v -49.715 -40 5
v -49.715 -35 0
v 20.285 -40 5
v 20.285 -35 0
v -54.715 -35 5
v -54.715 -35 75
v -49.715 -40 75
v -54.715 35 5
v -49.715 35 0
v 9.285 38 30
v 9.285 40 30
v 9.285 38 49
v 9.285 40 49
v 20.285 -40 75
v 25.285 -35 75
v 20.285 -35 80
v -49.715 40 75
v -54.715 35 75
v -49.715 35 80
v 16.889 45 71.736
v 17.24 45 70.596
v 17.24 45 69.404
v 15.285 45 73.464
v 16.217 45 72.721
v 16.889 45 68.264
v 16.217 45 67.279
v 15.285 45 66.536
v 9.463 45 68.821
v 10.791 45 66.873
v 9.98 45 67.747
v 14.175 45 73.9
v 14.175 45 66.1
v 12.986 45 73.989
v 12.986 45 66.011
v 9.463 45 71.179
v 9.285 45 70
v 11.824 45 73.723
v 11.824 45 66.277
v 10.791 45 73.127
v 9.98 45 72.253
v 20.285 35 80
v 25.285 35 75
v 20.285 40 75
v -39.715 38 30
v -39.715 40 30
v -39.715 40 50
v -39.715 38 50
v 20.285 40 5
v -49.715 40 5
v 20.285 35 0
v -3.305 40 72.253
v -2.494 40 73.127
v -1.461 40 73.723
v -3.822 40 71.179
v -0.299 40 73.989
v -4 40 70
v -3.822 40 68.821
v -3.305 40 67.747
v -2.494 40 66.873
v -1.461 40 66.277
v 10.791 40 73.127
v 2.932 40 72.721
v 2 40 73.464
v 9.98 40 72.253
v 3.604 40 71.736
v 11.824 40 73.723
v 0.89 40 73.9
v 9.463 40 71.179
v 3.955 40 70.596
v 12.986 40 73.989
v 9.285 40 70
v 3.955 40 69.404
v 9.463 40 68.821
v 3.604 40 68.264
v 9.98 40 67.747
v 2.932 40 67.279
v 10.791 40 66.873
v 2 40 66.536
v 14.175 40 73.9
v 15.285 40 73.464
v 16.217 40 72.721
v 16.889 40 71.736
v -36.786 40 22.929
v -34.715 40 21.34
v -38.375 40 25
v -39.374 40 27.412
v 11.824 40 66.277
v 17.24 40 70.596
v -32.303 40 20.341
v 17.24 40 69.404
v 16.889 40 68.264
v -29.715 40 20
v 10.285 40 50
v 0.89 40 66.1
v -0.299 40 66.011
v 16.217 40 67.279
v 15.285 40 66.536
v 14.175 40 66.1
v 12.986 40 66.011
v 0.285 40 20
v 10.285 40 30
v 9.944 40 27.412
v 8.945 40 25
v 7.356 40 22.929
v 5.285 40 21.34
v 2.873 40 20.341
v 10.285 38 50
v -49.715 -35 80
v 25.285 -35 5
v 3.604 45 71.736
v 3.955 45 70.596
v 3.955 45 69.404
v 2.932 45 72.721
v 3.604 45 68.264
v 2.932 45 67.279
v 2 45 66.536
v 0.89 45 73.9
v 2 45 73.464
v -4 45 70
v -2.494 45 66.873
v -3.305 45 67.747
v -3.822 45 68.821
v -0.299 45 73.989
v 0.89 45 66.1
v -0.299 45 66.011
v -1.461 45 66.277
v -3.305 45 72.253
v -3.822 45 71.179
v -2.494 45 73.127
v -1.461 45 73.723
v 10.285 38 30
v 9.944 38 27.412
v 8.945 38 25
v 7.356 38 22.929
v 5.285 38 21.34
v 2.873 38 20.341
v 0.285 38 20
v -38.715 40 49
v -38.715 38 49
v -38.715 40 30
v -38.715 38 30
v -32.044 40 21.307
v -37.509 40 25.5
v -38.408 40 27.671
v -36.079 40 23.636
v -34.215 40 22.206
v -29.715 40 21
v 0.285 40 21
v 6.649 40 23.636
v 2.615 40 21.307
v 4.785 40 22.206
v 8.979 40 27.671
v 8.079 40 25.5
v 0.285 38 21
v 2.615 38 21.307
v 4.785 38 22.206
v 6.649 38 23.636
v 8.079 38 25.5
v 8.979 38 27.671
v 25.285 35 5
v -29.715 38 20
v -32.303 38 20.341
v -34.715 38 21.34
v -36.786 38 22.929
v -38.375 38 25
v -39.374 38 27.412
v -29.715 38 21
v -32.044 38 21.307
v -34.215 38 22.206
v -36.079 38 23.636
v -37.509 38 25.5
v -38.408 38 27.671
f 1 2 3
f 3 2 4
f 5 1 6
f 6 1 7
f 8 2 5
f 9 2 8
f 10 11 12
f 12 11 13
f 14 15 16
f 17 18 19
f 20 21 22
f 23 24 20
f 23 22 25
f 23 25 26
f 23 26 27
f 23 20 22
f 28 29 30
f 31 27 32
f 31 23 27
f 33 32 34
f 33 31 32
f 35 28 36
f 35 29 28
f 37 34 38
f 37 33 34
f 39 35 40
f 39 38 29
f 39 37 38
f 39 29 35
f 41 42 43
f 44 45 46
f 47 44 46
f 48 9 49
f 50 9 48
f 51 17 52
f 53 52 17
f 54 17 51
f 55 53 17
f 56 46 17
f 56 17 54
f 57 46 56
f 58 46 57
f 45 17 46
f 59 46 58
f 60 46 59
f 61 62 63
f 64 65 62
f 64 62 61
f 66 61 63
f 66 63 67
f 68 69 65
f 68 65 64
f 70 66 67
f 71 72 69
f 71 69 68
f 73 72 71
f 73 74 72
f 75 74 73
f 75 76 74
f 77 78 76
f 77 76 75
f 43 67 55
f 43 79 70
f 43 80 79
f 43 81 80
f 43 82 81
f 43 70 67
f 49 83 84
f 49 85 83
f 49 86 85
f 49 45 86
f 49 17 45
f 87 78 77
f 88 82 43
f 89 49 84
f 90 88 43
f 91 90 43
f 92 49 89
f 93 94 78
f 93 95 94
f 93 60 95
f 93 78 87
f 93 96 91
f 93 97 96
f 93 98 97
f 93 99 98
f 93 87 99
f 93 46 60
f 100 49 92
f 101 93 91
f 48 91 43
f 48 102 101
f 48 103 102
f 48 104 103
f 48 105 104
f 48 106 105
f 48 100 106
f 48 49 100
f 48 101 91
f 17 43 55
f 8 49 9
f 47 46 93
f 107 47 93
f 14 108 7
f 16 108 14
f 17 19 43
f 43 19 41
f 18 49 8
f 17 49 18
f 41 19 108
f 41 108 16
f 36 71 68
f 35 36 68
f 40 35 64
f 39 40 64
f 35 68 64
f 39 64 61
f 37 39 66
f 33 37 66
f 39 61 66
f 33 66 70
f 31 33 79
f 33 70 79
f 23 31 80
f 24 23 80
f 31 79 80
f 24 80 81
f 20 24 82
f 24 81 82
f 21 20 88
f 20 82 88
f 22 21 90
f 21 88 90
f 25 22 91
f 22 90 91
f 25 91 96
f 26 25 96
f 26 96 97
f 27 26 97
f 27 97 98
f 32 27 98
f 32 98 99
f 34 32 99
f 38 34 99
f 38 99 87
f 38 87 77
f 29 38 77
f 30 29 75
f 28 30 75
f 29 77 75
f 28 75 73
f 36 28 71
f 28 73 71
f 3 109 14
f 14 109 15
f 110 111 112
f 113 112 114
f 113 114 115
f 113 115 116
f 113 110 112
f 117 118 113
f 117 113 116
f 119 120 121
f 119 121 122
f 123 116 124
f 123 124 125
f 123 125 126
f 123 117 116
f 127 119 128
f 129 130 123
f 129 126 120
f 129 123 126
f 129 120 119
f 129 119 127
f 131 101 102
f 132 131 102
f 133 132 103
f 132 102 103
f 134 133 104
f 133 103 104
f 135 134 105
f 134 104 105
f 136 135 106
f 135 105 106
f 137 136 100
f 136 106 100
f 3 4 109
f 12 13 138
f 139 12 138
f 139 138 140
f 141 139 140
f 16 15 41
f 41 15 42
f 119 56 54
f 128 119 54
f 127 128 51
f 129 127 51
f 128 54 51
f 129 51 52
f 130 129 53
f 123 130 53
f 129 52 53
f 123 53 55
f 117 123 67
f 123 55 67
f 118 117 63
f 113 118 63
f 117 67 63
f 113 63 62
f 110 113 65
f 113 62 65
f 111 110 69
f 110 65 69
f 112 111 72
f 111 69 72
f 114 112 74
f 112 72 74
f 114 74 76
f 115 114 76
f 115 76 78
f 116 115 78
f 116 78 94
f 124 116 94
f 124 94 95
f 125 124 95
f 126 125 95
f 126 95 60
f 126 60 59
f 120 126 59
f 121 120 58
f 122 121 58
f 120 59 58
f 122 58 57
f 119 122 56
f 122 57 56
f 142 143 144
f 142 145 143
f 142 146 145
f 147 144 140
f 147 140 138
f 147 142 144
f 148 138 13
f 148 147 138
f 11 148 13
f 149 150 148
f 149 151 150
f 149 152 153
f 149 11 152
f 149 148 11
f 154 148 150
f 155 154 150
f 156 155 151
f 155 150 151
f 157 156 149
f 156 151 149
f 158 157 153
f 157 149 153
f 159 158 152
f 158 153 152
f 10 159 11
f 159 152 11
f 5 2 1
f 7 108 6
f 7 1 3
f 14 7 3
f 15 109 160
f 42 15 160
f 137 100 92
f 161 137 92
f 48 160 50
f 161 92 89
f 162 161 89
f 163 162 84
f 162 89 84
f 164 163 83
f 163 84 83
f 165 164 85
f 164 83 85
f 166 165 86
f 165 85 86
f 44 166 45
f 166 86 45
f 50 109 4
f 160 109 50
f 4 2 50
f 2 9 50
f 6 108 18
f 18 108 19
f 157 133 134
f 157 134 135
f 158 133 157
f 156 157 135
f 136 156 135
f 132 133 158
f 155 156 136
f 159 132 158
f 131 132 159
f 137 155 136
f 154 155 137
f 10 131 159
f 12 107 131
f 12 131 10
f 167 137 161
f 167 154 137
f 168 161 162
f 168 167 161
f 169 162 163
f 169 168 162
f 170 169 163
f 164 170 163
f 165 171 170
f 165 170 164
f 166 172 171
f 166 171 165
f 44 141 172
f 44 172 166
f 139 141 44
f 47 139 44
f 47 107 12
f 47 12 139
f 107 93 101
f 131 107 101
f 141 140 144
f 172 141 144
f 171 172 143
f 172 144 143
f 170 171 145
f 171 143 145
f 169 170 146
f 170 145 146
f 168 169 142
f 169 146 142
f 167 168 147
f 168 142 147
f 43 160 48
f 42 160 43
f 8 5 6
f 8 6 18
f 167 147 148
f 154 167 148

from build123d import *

# Parameters (mm, degrees)
F0_W     = 80
F0_H     = 80
F1_DEPTH = 80
F2_R     = 4
F3_DEPTH = 5
F5_DEPTH = 2
F6_SIZE  = 5


with BuildPart() as f1:
    # F0 (on Top) → F1 (new body)
    with BuildSketch(Plane.XY):
        with Locations((-14.714826, 3.9e-05)):
            Rectangle(F0_W, F0_H)
    extrude(amount=F1_DEPTH)

    # F2 (on face) → F3 (join)
    with BuildSketch(Plane(origin=(0, 40.000039, 0), x_dir=(-1, 0, 0), z_dir=(0, 1, 0))):
        with Locations((0, 70)):
            Circle(F2_R)
        with Locations((-13.285174, 70)):
            Circle(F2_R)
    extrude(amount=F3_DEPTH)

    # F4 (on face) → F5 (cut)
    with BuildSketch(Plane(origin=(0, 40.000039, 0), x_dir=(-1, 0, 0), z_dir=(0, 1, 0))):
        with BuildLine():
            Line((39.714826, 50), (-10.285174, 50))
            Line((-10.285174, 50), (-10.285174, 30))
            ThreePointArc((-10.285174, 30), (-7.356242, 22.928932), (-0.285174, 20))
            Line((-0.285174, 20), (29.714826, 20))
            ThreePointArc((29.714826, 20), (36.785894, 22.928932), (39.714826, 30))
            Line((39.714826, 30), (39.714826, 50))
        make_face()
        with BuildLine():
            Line((-9.285174, 30), (-9.285174, 49))
            Line((-9.285174, 49), (38.714826, 49))
            Line((38.714826, 49), (38.714826, 30))
            ThreePointArc((38.714826, 30), (36.078787, 23.636039), (29.714826, 21))
            Line((29.714826, 21), (-0.285174, 21))
            ThreePointArc((-0.285174, 21), (-6.649135, 23.636039), (-9.285174, 30))
        make_face(mode=Mode.SUBTRACT)
    extrude(amount=-F5_DEPTH, mode=Mode.SUBTRACT)

    # F6
    f6_edges = [f1.edges().sort_by_distance(p)[0] for p in [
        (-14.714826, -39.999961, 0),
        (25.285174, 3.9e-05, 0),
        (25.285174, -39.999961, 40),
        (25.285174, 40.000039, 40),
        (25.285174, 3.9e-05, 80),
        (-54.714826, 40.000039, 40),
        (-14.714826, 40.000039, 0),
        (-54.714826, 3.9e-05, 0),
        (-54.714826, 3.9e-05, 80),
        (-14.714826, 40.000039, 80),
        (-14.714826, -39.999961, 80),
        (-54.714826, -39.999961, 40),
    ]]
    chamfer(f6_edges, length=F6_SIZE)


solid = f1.part
